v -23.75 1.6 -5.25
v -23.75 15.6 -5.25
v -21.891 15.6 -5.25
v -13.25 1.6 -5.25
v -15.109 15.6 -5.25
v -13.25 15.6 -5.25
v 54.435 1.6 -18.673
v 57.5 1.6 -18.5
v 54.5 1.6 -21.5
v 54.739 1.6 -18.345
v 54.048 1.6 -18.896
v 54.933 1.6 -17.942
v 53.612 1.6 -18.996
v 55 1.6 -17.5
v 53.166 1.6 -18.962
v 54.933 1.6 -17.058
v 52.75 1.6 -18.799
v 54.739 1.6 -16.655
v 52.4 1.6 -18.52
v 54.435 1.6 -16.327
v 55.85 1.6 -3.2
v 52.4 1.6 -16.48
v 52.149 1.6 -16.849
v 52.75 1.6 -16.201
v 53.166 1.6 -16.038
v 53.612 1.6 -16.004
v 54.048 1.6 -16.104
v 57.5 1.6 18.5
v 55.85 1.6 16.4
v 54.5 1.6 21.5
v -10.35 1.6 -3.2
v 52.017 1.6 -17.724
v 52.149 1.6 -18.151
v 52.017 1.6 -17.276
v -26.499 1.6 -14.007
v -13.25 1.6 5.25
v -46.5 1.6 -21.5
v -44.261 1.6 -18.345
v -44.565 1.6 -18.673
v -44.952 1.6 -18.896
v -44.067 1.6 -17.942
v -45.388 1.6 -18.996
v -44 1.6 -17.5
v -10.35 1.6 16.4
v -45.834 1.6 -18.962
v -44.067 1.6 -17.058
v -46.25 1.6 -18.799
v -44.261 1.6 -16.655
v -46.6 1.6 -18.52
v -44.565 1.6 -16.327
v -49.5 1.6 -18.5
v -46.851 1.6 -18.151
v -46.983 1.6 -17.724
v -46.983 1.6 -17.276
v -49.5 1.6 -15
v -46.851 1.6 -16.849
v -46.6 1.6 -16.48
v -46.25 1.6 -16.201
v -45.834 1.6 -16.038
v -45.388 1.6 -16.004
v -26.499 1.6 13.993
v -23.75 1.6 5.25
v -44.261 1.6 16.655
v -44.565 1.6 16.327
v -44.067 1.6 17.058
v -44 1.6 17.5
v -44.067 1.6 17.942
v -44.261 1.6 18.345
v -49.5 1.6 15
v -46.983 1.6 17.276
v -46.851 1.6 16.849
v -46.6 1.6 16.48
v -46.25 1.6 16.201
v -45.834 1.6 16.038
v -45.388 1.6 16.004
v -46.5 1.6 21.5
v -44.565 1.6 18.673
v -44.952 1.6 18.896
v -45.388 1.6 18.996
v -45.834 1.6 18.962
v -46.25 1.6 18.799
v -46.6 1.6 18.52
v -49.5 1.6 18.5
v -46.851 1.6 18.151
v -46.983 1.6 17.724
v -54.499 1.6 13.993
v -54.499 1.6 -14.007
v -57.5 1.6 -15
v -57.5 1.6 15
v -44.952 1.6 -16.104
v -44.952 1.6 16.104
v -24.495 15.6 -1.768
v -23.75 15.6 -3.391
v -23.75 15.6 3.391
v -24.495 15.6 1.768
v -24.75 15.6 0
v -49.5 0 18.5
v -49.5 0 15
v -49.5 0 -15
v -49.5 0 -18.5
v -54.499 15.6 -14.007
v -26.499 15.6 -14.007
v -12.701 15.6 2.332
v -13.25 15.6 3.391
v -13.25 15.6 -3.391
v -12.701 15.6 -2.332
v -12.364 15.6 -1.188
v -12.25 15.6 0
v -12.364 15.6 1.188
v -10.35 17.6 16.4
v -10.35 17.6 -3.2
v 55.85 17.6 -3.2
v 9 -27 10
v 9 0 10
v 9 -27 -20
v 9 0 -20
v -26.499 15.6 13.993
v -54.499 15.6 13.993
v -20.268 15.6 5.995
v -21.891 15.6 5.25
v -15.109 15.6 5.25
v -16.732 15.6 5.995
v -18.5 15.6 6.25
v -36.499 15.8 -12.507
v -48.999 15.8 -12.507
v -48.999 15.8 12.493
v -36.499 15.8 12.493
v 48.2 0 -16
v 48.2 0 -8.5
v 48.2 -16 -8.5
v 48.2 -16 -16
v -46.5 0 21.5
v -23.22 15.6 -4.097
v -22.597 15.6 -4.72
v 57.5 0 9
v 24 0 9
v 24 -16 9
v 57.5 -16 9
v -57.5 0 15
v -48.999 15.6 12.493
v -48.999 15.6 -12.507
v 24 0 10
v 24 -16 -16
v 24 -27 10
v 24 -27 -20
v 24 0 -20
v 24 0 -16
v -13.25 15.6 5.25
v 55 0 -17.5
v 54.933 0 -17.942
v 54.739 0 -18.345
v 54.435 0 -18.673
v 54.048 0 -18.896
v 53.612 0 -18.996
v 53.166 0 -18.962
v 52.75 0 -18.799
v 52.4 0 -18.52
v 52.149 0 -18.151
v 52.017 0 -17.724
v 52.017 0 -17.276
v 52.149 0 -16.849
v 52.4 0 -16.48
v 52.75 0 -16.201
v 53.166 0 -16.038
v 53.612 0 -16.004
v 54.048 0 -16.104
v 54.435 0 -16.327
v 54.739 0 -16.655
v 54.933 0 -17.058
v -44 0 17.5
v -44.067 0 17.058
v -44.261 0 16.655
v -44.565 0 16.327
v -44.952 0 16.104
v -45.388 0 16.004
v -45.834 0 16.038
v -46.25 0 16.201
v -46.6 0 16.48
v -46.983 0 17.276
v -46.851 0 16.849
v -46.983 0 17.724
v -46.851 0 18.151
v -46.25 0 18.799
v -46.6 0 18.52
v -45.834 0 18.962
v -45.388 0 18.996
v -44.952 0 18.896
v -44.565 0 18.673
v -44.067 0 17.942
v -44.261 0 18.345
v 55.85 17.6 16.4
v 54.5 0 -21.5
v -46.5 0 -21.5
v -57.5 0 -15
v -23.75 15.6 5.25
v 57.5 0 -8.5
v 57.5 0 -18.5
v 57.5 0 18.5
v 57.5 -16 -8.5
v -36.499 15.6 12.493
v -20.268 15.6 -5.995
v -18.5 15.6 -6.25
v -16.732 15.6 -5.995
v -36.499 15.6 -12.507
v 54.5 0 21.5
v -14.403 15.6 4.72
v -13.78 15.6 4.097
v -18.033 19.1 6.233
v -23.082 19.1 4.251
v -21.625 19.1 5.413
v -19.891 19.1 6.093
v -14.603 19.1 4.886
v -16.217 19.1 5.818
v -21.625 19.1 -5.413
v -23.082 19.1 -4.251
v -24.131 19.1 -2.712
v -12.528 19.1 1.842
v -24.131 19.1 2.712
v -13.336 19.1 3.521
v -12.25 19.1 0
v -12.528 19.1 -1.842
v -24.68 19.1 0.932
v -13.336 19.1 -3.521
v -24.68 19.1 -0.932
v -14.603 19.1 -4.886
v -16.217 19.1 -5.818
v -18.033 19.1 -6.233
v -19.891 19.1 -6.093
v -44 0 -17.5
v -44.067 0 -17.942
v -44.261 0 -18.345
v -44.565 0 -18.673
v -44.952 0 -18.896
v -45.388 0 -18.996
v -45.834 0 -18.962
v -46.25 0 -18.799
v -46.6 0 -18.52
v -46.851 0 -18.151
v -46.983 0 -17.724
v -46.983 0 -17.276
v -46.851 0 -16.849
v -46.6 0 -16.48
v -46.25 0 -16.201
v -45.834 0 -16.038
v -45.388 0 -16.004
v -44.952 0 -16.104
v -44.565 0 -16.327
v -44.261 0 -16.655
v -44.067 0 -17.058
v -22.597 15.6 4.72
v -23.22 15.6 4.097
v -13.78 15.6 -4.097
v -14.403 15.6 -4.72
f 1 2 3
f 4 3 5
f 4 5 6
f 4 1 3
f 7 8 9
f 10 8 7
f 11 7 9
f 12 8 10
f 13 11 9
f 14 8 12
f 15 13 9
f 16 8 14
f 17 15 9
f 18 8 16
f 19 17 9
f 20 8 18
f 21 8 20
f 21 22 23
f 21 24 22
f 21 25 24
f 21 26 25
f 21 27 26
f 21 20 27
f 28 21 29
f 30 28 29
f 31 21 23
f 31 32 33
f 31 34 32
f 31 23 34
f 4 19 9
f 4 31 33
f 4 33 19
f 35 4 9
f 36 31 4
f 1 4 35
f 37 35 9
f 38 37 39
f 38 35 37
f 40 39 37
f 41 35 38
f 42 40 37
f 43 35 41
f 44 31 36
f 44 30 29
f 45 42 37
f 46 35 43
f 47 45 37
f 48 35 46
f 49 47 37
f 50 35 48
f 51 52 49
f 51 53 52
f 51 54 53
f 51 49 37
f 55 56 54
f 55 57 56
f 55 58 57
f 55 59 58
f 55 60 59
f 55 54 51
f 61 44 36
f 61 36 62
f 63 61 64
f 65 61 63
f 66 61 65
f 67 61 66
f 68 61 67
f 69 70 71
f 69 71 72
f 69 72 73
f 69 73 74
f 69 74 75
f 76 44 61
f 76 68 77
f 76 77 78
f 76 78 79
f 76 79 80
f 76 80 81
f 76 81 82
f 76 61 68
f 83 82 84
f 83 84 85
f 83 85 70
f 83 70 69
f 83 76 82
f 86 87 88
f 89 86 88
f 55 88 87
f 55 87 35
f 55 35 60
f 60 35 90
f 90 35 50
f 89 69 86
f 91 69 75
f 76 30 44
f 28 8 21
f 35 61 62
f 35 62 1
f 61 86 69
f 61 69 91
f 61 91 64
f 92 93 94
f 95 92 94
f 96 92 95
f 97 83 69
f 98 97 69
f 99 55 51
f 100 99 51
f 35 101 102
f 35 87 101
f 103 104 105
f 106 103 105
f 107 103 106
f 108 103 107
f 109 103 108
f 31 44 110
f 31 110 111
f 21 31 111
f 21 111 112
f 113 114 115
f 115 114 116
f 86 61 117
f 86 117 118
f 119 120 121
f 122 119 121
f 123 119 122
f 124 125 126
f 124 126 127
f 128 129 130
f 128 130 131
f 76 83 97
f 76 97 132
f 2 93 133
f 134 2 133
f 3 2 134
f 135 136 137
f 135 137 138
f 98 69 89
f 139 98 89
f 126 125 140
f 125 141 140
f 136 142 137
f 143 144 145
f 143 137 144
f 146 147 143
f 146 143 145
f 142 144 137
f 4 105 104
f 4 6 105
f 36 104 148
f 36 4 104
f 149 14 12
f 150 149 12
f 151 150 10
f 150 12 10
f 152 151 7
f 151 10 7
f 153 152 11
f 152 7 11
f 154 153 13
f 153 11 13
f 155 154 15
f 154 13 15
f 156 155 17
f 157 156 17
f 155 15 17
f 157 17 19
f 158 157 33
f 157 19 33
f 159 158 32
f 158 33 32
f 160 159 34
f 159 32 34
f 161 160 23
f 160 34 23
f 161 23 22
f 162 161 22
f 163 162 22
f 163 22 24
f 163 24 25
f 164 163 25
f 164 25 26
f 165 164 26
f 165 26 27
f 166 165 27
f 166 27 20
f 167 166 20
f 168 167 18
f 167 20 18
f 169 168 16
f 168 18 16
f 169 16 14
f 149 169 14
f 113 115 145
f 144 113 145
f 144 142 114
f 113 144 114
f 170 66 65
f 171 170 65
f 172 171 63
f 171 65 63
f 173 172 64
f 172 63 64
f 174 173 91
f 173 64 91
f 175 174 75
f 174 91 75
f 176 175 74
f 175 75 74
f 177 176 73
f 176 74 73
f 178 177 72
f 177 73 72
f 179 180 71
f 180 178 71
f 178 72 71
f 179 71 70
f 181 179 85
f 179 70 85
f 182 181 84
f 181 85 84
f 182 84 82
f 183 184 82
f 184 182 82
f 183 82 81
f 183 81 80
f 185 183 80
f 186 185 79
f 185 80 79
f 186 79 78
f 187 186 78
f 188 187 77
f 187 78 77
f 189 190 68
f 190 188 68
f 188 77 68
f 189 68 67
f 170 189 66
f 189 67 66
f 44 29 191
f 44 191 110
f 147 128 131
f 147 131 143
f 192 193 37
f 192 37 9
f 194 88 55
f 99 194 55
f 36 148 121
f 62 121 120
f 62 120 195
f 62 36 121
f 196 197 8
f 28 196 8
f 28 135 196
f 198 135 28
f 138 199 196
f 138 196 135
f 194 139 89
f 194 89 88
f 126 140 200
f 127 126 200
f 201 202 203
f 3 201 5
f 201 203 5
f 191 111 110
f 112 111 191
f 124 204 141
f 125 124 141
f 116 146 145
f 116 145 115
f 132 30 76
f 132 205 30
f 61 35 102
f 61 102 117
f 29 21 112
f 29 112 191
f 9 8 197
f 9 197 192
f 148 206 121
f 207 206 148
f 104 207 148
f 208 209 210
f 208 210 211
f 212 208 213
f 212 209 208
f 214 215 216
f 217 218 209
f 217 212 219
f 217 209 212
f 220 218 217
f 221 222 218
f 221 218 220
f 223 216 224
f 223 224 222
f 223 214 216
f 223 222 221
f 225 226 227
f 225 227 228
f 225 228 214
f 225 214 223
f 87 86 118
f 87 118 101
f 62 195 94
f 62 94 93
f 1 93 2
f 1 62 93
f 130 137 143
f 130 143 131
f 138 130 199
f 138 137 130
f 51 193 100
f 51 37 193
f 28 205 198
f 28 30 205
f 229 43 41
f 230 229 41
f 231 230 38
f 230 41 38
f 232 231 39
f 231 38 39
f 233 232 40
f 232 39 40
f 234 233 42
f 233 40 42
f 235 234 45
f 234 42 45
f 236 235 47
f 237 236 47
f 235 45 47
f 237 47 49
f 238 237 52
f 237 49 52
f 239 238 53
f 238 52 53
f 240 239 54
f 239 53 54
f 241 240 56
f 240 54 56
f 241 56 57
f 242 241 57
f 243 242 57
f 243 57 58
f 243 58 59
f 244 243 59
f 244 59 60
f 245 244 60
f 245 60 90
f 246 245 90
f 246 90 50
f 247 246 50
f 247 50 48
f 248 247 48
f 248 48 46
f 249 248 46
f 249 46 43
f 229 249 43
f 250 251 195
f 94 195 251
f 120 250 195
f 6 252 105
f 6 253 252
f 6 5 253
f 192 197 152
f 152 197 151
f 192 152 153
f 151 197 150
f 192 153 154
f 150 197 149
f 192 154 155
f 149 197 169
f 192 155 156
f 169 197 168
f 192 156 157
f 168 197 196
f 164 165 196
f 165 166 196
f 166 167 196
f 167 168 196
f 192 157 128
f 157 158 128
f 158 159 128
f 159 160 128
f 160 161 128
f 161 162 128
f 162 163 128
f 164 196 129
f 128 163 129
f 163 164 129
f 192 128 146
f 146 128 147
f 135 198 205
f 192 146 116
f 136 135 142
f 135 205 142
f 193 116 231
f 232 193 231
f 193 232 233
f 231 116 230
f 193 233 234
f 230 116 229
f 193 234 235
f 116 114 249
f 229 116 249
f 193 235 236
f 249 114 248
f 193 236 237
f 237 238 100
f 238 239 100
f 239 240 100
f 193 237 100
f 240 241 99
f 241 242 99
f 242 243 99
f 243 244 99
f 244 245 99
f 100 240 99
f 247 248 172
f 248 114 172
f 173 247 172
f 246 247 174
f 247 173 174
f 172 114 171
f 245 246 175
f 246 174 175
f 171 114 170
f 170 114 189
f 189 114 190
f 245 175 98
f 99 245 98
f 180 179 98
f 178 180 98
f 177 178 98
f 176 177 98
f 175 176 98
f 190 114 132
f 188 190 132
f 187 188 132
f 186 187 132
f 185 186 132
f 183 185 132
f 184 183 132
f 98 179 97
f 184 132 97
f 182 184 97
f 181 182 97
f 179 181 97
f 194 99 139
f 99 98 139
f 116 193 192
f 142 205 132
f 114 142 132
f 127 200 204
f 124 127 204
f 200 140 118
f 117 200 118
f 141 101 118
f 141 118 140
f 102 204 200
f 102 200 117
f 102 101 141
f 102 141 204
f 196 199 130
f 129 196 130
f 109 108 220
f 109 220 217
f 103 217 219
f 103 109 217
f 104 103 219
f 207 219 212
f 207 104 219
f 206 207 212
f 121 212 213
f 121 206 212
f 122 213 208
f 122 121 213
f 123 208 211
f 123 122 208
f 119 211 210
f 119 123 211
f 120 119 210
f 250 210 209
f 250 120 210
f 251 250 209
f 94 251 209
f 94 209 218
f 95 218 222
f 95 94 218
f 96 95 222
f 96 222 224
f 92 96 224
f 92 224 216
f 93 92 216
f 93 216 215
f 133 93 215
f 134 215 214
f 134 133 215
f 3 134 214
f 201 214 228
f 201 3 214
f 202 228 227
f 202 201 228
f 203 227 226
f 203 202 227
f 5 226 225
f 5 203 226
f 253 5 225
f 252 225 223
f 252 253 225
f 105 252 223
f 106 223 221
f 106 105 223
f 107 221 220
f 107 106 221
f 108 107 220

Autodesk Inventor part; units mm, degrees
ref_plane "YZ Plane" through (0, 0, 0) normal (1, 0, 0) x (0, 1, 0)
ref_plane "XZ Plane" through (0, 0, 0) normal (0, 1, 0) x (-1, 0, 0)
ref_plane "XY Plane" through (0, 0, 0) normal (0, 0, 1) x (1, 0, 0)
sketch "Sketch1" plane through (0, 0, 0) normal (0, 1, 0) x (-1, 0, 0)
  line L0 (-57.5, 21.5) -> (57.5, 21.5)
  line L1 (57.5, 21.5) -> (57.5, -21.5)
  line L2 (57.5, -21.5) -> (-57.5, -21.5)
  line L3 (-57.5, -21.5) -> (-57.5, 21.5)
  line L4 (-57.5, 21.5) -> (57.5, -21.5) construction
  line L5 (57.5, 21.5) -> (-57.5, -21.5) construction
  point P0 (0, 0)
  dimension "d0" = 115
  dimension "d1" = 43
extrude "Extrusion1" add sketch "Sketch1" along normal blind 1.6
sketch "Sketch2" plane through (0, 1.6, 0) normal (0, 1, 0) x (1, 0, 0)
  line L0 (57.5, 21.5) -> (-57.5, 21.5) projected
  line L1 (57.5, 21.5) -> (54.5, 21.5)
  line L2 (57.5, -21.5) -> (57.5, 21.5) projected
  line L3 (54.5, 21.5) -> (57.5, 21.5)
  line L4 (57.5, 21.5) -> (57.5, 18.5)
  line L5 (57.5, 18.5) -> (54.5, 21.5)
  point P0 (0, 0)
  dimension "d4" = 3
  dimension "d5" = 3
extrude "Extrusion2" cut sketch "Sketch2" against normal blind 1.6
sketch "Sketch3" plane through (0, 1.6, 0) normal (0, 1, 0) x (1, 0, 0)
  line L0 (57.5, -21.5) -> (57.5, 18.5) projected
  circle A0 centre (53.5, 17.5) radius 1.5
  point P0 (0, 0)
  dimension "d11" = 3
extrude "Extrusion3" cut sketch "Sketch3" against normal blind 1.6
sketch "Sketch4" plane through (0, 1.6, 0) normal (0, 1, 0) x (1, 0, 0)
  line L0 (-57.5, 21.5) -> (-57.5, -21.5) projected
  line L1 (-57.5, 15) -> (-49.5, 15)
  line L2 (-49.5, 15) -> (-49.5, 18.5)
  line L3 (54.5, 21.5) -> (-57.5, 21.5) projected
  line L4 (-46.5, 21.5) -> (-49.5, 18.5)
  circle A0 centre (-45.5, 18) radius 1.5
  point P0 (0, 0)
  dimension "d15" = 8
  dimension "d16" = 3.5
  dimension "d20" = 3
extrude "Extrusion4" cut sketch "Sketch4" against normal blind 1.6 contours L3 L4 L2 L1 L0
sketch "Sketch5" plane through (0, 1.6, 0) normal (0, 1, 0) x (1, 0, 0)
  line L0 (54.5, 21.5) -> (-46.5, 21.5) projected
  circle A0 centre (-45.5, 17.5) radius 1.5
  point P0 (0, 0)
  dimension "d25" = 3
extrude "Extrusion5" cut sketch "Sketch5" against normal blind 1.6
mirror "Mirror1" about plane through (0, 0, 0) normal (0, 0, 1) of "Extrusion4", "Extrusion5", "Extrusion2"
sketch "Sketch7" plane through (0, 1.6, 0) normal (0, 1, 0) x (1, 0, 0)
  line L0 (-54.4988, 14.0073) -> (-26.4988, 14.0073)
  line L1 (-26.4988, 14.0073) -> (-26.4988, -13.9927)
  line L2 (-26.4988, -13.9927) -> (-54.4988, -13.9927)
  line L3 (-54.4988, -13.9927) -> (-54.4988, 14.0073)
  point P0 (0, 0)
  dimension "d30" = 28
  dimension "d31" = 28
extrude "Extrusion6" add sketch "Sketch7" along normal blind 14
sketch "Sketch8" plane through (0, 15.6, 0) normal (0, 1, 0) x (1, 0, 0)
  line L0 (-26.4988, 14.0073) -> (-26.4988, -13.9927) projected
  line L1 (-26.4988, 14.0073) -> (-36.4988, 14.0073)
  line L2 (-54.4988, 14.0073) -> (-26.4988, 14.0073) projected
  line L3 (-36.4988, 14.0073) -> (-37.9988, 14.0073)
  line L4 (-37.9988, 14.0073) -> (-36.4988, 14.0073)
  line L5 (-36.4988, 14.0073) -> (-36.4988, 12.5073)
  line L6 (-36.4988, 12.5073) -> (-48.9988, 12.5073)
  line L7 (-48.9988, 12.5073) -> (-48.9988, -12.4927)
  line L8 (-48.9988, -12.4927) -> (-36.4988, -12.4927)
  line L9 (-36.4988, -12.4927) -> (-36.4988, 12.5073)
  point P0 (0, 0)
  dimension "d34" = 10
  dimension "d35" = 1.5
  dimension "d36" = 1.5
  dimension "d37" = 12.5
  dimension "d38" = 25
extrude "Extrusion7" add sketch "Sketch8" along normal blind 0.2
sketch "Sketch9" plane through (0, 1.6, 0) normal (0, 1, 0) x (1, 0, 0)
  line L0 (-57.5, 15) -> (-57.5, -15) projected
  line L1 (-57.5, 15) -> (-23.75, 15)
  line L2 (-23.75, 15) -> (-23.75, 5.25)
  line L3 (-23.75, 5.25) -> (-13.25, 5.25)
  line L4 (-13.25, 5.25) -> (-13.25, -5.25)
  line L5 (-13.25, -5.25) -> (-23.75, -5.25)
  line L6 (-23.75, -5.25) -> (-23.75, 5.25)
  point P0 (0, 0)
  dimension "d41" = 33.75
  dimension "d43" = 9.75
  dimension "d44" = 10.5
  dimension "d45" = 10.5
extrude "Extrusion8" add sketch "Sketch9" along normal blind 14
sketch "Sketch10" plane through (0, 15.6, 0) normal (0, 1, 0) x (1, 0, 0)
  circle A0 centre (-18.5, 0) radius 6.25
  point P0 (0, 0)
  dimension "d48" = 12.5
extrude "Extrusion9" add sketch "Sketch10" along normal blind 3.5
sketch "Sketch11" plane through (0, 1.6, 0) normal (0, 1, 0) x (1, 0, 0)
  line L0 (54.5, -21.5) -> (57.5, -18.5) projected
  line L1 (57.5, -18.5) -> (55.85, -18.5)
  line L2 (55.85, -18.5) -> (55.85, -16.4)
  line L3 (55.85, -16.4) -> (57.5, -16.4)
  line L4 (57.5, -16.4) -> (57.5, -18.5)
  line L5 (55.85, -16.4) -> (-10.35, -16.4)
  line L6 (-10.35, -16.4) -> (-10.35, 3.2)
  line L7 (-10.35, 3.2) -> (55.85, 3.2)
  line L8 (55.85, 3.2) -> (55.85, -16.4)
  point P0 (0, 0)
  dimension "d51" = 1.65
  dimension "d52" = 2.1
  dimension "d53" = 66.2
  dimension "d54" = 19.6
extrude "Extrusion10" add sketch "Sketch11" along normal blind 16 contours L5 L6 L7 L8
sketch "Sketch12" plane through (0, 0, 0) normal (0, -1, 0) x (1, 0, 0)
  line L0 (57.5, 18.5) -> (57.5, -18.5) projected
  line L1 (57.5, -18.5) -> (57.5, -8.5)
  line L2 (57.5, -8.5) -> (48.2, -8.5)
  line L3 (48.2, -8.5) -> (48.2, 9)
  line L4 (48.2, 9) -> (57.5, 9)
  line L5 (57.5, 9) -> (57.5, -8.5)
  point P0 (0, 0)
  dimension "d57" = 10
  dimension "d58" = 9.3
  dimension "d59" = 17.5
extrude "Extrusion11" add sketch "Sketch12" along normal blind 16
sketch "Sketch13" plane through (0, 0, 0) normal (0, -1, 0) x (1, 0, 0)
  line L0 (57.5, -8.5) -> (48.2, -8.5) projected
  line L1 (48.2, -8.5) -> (48.2, -16)
  line L2 (48.2, -16) -> (24, -16)
  line L3 (24, -16) -> (24, 9)
  line L4 (24, 9) -> (48.2, 9)
  line L5 (48.2, 9) -> (48.2, -16)
  line L6 (24, -16) -> (24, -20)
  line L7 (54.5, -21.5) -> (-46.5, -21.5) projected
  line L8 (24, -20) -> (9, -20)
  line L9 (24, 9) -> (24, 10)
  line L10 (24, 10) -> (9, 10)
  line L11 (9, 10) -> (9, -20)
  line L12 (9, -20) -> (24, -20)
  line L13 (24, -20) -> (24, 10)
  point P0 (0, 0)
  dimension "d62" = 7.5
  dimension "d63" = 24.2
  dimension "d64" = 25
  dimension "d65" = 4
  dimension "d66" = 15
  dimension "d67" = 1
extrude "Extrusion12" add sketch "Sketch13" along normal blind 16 contours L1 L2 L3 L4 L5
sketch "Sketch14" plane through (0, 0, 0) normal (0, -1, 0) x (1, 0, 0)
  line L0 (24, -16) -> (24, 9) projected
  line L1 (24, -16) -> (24, -20)
  line L2 (24, -20) -> (9, -20)
  line L3 (24, 9) -> (24, 10)
  line L4 (24, 10) -> (9, 10)
  line L5 (9, 10) -> (9, -20)
  line L6 (9, -20) -> (24, -20)
  line L7 (24, -20) -> (24, 10)
  point P0 (0, 0)
  dimension "d70" = 4
  dimension "d71" = 15
  dimension "d72" = 1
extrude "Extrusion13" add sketch "Sketch14" along normal blind 27
properties part number "teaser_PCB"
